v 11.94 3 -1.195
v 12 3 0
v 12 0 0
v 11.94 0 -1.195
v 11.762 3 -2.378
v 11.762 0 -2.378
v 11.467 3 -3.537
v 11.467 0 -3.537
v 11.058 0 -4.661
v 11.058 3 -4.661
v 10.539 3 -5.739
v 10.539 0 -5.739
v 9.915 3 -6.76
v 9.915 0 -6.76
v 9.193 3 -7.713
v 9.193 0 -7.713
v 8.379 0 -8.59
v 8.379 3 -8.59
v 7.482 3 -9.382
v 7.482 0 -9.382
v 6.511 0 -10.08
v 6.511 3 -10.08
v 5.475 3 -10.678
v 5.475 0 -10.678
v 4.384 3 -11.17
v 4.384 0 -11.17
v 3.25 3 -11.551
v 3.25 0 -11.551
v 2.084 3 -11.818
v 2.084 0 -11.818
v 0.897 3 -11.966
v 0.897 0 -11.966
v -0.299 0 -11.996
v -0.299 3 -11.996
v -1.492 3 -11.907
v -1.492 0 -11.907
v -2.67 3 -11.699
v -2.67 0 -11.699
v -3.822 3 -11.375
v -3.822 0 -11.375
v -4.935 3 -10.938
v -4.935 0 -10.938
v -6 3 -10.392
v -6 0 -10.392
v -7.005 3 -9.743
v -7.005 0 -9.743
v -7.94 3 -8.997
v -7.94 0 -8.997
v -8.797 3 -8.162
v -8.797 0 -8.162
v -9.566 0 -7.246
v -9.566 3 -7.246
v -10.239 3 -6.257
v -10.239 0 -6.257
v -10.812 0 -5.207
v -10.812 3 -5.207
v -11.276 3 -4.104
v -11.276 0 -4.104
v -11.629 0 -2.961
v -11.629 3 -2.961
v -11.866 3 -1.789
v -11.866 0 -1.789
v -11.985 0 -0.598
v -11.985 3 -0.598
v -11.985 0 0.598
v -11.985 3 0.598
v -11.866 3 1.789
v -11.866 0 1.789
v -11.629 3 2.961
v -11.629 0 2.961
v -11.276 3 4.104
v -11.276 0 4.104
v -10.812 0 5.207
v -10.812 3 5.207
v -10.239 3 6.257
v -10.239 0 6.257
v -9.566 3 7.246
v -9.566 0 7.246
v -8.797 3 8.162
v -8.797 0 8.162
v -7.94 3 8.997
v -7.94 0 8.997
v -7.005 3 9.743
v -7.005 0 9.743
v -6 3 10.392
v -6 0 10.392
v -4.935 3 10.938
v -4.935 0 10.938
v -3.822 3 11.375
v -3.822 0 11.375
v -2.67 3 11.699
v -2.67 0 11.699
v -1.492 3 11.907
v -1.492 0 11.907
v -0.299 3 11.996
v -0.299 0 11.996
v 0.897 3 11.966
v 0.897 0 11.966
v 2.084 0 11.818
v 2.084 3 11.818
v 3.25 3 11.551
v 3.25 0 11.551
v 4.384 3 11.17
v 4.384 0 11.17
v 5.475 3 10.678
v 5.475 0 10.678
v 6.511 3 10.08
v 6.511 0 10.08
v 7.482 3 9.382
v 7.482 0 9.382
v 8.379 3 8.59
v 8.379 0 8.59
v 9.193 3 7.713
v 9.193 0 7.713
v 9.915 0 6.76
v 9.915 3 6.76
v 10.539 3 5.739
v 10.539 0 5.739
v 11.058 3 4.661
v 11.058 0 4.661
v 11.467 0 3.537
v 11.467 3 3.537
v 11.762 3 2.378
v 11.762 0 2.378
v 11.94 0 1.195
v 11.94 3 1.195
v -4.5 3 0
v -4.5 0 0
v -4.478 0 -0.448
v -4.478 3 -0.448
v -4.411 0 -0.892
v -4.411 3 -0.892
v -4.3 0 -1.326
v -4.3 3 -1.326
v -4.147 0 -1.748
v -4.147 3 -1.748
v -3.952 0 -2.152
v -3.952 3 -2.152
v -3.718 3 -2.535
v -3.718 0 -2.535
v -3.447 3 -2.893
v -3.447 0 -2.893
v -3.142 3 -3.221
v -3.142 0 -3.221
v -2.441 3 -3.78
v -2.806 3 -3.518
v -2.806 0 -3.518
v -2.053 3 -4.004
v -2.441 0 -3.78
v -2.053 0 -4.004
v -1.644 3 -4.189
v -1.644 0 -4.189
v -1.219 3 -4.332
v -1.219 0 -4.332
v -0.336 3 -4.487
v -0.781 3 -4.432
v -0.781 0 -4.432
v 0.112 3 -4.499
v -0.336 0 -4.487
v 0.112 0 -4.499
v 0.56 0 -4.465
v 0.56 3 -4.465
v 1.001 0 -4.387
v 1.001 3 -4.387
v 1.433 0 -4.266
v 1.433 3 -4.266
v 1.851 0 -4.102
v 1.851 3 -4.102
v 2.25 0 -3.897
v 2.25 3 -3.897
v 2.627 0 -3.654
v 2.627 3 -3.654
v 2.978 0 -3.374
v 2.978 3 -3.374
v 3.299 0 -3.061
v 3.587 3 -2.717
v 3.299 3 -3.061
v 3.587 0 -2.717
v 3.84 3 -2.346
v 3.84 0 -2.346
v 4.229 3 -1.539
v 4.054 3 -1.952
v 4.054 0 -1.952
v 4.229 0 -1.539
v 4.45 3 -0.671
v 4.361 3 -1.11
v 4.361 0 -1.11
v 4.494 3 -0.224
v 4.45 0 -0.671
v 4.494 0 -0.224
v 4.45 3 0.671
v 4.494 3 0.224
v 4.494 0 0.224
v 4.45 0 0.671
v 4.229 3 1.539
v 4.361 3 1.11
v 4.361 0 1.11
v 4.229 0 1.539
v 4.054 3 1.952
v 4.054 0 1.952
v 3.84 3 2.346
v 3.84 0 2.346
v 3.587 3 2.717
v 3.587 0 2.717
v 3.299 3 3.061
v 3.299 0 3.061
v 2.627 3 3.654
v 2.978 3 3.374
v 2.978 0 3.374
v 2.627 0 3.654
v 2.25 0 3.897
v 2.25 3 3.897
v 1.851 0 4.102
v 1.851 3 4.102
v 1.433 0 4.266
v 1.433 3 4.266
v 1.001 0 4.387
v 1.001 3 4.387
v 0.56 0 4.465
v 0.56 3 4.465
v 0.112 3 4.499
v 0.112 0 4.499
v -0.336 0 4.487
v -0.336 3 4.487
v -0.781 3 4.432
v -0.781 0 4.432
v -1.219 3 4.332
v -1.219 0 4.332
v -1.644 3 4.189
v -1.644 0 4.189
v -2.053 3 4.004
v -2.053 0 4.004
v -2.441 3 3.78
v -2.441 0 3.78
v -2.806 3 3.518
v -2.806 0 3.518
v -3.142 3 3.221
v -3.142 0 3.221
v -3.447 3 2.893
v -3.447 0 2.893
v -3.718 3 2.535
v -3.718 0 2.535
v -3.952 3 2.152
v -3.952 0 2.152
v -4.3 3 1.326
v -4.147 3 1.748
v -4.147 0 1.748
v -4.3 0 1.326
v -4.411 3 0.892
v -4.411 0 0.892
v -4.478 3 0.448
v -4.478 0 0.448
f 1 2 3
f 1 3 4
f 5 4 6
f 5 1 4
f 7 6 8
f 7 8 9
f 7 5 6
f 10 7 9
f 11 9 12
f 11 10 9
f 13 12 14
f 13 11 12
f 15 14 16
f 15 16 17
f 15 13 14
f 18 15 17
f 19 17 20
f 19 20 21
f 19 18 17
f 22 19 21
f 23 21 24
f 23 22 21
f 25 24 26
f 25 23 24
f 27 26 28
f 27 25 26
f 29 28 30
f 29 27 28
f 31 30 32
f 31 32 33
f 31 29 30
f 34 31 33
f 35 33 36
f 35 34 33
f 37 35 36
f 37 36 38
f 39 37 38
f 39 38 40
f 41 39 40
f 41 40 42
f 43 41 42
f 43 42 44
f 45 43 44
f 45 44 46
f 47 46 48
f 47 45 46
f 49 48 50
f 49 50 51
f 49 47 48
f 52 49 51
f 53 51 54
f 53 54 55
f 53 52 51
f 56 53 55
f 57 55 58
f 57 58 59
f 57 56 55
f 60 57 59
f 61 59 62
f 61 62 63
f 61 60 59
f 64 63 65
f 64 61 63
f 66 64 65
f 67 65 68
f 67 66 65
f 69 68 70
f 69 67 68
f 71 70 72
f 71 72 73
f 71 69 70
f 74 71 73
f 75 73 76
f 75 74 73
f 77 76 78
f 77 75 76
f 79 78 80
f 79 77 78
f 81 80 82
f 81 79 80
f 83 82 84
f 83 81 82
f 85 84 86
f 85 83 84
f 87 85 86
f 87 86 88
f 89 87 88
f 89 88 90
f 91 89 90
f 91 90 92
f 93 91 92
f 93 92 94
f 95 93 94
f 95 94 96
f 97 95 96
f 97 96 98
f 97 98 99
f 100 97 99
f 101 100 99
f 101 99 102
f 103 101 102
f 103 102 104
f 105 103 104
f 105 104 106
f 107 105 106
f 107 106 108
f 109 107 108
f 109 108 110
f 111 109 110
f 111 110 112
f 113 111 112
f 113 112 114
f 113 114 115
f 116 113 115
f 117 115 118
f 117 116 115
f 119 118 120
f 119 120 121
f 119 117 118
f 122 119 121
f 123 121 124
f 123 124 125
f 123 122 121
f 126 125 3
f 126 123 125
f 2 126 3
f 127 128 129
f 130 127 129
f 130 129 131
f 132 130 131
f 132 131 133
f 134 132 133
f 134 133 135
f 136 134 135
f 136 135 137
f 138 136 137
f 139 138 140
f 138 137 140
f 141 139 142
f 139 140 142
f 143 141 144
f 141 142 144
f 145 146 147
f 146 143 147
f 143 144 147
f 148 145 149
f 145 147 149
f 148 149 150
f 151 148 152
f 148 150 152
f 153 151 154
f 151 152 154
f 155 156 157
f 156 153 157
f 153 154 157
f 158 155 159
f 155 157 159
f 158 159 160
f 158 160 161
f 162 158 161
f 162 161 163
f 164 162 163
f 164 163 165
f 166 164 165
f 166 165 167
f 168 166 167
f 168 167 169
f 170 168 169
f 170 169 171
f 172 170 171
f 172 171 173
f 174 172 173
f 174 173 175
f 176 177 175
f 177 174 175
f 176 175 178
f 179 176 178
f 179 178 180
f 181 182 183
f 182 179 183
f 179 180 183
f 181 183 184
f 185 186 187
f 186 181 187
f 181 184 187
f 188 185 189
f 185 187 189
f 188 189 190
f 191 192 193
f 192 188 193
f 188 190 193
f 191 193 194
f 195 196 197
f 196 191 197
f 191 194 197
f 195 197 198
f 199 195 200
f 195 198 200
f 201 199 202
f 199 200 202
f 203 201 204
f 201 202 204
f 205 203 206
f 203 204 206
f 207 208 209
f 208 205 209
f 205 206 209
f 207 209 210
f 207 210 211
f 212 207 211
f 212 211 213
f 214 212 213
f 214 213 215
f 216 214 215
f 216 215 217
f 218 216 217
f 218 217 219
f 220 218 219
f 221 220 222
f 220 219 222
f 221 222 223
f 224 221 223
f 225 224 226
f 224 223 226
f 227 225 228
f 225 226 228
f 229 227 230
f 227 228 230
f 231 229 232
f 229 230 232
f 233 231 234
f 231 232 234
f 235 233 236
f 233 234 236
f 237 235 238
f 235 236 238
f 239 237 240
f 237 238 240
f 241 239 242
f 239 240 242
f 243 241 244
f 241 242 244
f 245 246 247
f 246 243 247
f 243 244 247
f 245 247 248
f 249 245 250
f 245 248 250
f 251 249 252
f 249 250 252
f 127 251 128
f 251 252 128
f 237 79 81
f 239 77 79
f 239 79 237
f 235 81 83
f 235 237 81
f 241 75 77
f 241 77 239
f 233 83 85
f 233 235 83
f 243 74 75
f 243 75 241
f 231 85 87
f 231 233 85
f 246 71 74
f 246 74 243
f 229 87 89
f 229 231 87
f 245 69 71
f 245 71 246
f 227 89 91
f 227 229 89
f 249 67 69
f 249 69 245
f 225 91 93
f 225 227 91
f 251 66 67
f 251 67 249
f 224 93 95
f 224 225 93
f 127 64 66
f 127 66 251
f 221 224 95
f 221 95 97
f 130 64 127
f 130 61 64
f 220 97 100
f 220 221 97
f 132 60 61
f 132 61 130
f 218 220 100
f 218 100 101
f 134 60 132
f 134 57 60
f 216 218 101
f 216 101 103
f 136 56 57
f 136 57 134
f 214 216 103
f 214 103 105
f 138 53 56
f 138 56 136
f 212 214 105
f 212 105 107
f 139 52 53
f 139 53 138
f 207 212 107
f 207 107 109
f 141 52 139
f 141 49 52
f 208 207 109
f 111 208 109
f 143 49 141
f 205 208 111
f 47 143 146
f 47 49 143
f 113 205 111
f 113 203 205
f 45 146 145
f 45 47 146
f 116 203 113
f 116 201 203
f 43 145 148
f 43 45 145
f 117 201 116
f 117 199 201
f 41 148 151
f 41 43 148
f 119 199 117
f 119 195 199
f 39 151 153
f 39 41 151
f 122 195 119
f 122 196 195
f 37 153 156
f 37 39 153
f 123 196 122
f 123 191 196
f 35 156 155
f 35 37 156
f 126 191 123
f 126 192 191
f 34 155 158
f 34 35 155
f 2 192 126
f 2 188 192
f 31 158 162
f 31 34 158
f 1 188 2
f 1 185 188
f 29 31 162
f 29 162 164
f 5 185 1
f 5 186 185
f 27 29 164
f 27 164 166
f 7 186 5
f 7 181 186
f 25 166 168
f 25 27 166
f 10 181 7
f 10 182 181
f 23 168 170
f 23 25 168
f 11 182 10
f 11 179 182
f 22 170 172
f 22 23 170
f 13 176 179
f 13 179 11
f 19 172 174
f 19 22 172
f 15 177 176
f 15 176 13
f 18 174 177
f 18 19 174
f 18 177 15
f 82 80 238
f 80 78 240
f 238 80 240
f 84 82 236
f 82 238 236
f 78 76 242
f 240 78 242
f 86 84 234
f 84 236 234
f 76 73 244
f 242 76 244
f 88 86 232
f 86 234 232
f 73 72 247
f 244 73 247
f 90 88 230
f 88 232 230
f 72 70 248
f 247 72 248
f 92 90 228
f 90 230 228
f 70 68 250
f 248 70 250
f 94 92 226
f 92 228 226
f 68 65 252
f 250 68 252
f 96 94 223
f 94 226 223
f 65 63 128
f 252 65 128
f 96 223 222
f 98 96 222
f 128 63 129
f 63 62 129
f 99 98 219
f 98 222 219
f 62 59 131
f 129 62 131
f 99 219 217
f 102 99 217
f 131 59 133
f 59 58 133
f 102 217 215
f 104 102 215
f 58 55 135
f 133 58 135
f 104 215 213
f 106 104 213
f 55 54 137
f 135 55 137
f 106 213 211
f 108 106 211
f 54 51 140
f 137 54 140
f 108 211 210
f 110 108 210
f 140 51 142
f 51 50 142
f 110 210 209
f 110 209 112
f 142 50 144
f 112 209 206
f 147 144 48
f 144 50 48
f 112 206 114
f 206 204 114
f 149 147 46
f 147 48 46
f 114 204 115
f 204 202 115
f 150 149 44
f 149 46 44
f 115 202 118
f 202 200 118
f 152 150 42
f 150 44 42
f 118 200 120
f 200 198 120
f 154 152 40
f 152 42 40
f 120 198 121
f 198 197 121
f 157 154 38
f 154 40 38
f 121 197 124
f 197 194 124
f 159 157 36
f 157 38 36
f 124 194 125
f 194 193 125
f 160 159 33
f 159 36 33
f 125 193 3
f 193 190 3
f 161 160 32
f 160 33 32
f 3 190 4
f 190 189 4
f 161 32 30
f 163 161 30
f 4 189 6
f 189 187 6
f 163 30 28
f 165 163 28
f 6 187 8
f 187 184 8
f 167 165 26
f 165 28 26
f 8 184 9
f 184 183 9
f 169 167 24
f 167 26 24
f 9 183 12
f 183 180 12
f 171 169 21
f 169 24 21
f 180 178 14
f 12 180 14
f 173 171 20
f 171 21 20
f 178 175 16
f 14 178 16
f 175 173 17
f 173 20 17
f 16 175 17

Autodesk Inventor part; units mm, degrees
ref_plane "YZ Plane" through (0, 0, 0) normal (1, 0, 0) x (0, 1, 0)
ref_plane "XZ Plane" through (0, 0, 0) normal (0, 1, 0) x (-1, 0, 0)
ref_plane "XY Plane" through (0, 0, 0) normal (0, 0, 1) x (1, 0, 0)
sketch "Sketch1" plane through (0, 0, 0) normal (0, 1, 0) x (-1, 0, 0)
  circle A0 centre (0, 0) radius 4.5
  circle A1 centre (0, 0) radius 10
  dimension "d0" = 9
  dimension "d1" = 20
extrude "Extrusion1" add sketch "Sketch1" along normal blind 3
sketch "Sketch2" plane through (0, 3, 0) normal (0, 1, 0) x (1, 0, 0)
  circle A0 centre (0, 0) radius 10
  circle A1 centre (0, 0) radius 10.5
  dimension "d4" = 21
extrude "Extrusion2" add sketch "Sketch2" against normal up to surface (3 mm away)
sketch "Sketch3" plane through (0, 3, 0) normal (0, 1, 0) x (1, 0, 0)
  circle A0 centre (0, 0) radius 12
  circle A1 centre (0, 0) radius 10.5
  dimension "d7" = 24
extrude "Extrusion3" add sketch "Sketch3" against normal up to surface (3 mm away)
properties part number "DedoAjuste"
